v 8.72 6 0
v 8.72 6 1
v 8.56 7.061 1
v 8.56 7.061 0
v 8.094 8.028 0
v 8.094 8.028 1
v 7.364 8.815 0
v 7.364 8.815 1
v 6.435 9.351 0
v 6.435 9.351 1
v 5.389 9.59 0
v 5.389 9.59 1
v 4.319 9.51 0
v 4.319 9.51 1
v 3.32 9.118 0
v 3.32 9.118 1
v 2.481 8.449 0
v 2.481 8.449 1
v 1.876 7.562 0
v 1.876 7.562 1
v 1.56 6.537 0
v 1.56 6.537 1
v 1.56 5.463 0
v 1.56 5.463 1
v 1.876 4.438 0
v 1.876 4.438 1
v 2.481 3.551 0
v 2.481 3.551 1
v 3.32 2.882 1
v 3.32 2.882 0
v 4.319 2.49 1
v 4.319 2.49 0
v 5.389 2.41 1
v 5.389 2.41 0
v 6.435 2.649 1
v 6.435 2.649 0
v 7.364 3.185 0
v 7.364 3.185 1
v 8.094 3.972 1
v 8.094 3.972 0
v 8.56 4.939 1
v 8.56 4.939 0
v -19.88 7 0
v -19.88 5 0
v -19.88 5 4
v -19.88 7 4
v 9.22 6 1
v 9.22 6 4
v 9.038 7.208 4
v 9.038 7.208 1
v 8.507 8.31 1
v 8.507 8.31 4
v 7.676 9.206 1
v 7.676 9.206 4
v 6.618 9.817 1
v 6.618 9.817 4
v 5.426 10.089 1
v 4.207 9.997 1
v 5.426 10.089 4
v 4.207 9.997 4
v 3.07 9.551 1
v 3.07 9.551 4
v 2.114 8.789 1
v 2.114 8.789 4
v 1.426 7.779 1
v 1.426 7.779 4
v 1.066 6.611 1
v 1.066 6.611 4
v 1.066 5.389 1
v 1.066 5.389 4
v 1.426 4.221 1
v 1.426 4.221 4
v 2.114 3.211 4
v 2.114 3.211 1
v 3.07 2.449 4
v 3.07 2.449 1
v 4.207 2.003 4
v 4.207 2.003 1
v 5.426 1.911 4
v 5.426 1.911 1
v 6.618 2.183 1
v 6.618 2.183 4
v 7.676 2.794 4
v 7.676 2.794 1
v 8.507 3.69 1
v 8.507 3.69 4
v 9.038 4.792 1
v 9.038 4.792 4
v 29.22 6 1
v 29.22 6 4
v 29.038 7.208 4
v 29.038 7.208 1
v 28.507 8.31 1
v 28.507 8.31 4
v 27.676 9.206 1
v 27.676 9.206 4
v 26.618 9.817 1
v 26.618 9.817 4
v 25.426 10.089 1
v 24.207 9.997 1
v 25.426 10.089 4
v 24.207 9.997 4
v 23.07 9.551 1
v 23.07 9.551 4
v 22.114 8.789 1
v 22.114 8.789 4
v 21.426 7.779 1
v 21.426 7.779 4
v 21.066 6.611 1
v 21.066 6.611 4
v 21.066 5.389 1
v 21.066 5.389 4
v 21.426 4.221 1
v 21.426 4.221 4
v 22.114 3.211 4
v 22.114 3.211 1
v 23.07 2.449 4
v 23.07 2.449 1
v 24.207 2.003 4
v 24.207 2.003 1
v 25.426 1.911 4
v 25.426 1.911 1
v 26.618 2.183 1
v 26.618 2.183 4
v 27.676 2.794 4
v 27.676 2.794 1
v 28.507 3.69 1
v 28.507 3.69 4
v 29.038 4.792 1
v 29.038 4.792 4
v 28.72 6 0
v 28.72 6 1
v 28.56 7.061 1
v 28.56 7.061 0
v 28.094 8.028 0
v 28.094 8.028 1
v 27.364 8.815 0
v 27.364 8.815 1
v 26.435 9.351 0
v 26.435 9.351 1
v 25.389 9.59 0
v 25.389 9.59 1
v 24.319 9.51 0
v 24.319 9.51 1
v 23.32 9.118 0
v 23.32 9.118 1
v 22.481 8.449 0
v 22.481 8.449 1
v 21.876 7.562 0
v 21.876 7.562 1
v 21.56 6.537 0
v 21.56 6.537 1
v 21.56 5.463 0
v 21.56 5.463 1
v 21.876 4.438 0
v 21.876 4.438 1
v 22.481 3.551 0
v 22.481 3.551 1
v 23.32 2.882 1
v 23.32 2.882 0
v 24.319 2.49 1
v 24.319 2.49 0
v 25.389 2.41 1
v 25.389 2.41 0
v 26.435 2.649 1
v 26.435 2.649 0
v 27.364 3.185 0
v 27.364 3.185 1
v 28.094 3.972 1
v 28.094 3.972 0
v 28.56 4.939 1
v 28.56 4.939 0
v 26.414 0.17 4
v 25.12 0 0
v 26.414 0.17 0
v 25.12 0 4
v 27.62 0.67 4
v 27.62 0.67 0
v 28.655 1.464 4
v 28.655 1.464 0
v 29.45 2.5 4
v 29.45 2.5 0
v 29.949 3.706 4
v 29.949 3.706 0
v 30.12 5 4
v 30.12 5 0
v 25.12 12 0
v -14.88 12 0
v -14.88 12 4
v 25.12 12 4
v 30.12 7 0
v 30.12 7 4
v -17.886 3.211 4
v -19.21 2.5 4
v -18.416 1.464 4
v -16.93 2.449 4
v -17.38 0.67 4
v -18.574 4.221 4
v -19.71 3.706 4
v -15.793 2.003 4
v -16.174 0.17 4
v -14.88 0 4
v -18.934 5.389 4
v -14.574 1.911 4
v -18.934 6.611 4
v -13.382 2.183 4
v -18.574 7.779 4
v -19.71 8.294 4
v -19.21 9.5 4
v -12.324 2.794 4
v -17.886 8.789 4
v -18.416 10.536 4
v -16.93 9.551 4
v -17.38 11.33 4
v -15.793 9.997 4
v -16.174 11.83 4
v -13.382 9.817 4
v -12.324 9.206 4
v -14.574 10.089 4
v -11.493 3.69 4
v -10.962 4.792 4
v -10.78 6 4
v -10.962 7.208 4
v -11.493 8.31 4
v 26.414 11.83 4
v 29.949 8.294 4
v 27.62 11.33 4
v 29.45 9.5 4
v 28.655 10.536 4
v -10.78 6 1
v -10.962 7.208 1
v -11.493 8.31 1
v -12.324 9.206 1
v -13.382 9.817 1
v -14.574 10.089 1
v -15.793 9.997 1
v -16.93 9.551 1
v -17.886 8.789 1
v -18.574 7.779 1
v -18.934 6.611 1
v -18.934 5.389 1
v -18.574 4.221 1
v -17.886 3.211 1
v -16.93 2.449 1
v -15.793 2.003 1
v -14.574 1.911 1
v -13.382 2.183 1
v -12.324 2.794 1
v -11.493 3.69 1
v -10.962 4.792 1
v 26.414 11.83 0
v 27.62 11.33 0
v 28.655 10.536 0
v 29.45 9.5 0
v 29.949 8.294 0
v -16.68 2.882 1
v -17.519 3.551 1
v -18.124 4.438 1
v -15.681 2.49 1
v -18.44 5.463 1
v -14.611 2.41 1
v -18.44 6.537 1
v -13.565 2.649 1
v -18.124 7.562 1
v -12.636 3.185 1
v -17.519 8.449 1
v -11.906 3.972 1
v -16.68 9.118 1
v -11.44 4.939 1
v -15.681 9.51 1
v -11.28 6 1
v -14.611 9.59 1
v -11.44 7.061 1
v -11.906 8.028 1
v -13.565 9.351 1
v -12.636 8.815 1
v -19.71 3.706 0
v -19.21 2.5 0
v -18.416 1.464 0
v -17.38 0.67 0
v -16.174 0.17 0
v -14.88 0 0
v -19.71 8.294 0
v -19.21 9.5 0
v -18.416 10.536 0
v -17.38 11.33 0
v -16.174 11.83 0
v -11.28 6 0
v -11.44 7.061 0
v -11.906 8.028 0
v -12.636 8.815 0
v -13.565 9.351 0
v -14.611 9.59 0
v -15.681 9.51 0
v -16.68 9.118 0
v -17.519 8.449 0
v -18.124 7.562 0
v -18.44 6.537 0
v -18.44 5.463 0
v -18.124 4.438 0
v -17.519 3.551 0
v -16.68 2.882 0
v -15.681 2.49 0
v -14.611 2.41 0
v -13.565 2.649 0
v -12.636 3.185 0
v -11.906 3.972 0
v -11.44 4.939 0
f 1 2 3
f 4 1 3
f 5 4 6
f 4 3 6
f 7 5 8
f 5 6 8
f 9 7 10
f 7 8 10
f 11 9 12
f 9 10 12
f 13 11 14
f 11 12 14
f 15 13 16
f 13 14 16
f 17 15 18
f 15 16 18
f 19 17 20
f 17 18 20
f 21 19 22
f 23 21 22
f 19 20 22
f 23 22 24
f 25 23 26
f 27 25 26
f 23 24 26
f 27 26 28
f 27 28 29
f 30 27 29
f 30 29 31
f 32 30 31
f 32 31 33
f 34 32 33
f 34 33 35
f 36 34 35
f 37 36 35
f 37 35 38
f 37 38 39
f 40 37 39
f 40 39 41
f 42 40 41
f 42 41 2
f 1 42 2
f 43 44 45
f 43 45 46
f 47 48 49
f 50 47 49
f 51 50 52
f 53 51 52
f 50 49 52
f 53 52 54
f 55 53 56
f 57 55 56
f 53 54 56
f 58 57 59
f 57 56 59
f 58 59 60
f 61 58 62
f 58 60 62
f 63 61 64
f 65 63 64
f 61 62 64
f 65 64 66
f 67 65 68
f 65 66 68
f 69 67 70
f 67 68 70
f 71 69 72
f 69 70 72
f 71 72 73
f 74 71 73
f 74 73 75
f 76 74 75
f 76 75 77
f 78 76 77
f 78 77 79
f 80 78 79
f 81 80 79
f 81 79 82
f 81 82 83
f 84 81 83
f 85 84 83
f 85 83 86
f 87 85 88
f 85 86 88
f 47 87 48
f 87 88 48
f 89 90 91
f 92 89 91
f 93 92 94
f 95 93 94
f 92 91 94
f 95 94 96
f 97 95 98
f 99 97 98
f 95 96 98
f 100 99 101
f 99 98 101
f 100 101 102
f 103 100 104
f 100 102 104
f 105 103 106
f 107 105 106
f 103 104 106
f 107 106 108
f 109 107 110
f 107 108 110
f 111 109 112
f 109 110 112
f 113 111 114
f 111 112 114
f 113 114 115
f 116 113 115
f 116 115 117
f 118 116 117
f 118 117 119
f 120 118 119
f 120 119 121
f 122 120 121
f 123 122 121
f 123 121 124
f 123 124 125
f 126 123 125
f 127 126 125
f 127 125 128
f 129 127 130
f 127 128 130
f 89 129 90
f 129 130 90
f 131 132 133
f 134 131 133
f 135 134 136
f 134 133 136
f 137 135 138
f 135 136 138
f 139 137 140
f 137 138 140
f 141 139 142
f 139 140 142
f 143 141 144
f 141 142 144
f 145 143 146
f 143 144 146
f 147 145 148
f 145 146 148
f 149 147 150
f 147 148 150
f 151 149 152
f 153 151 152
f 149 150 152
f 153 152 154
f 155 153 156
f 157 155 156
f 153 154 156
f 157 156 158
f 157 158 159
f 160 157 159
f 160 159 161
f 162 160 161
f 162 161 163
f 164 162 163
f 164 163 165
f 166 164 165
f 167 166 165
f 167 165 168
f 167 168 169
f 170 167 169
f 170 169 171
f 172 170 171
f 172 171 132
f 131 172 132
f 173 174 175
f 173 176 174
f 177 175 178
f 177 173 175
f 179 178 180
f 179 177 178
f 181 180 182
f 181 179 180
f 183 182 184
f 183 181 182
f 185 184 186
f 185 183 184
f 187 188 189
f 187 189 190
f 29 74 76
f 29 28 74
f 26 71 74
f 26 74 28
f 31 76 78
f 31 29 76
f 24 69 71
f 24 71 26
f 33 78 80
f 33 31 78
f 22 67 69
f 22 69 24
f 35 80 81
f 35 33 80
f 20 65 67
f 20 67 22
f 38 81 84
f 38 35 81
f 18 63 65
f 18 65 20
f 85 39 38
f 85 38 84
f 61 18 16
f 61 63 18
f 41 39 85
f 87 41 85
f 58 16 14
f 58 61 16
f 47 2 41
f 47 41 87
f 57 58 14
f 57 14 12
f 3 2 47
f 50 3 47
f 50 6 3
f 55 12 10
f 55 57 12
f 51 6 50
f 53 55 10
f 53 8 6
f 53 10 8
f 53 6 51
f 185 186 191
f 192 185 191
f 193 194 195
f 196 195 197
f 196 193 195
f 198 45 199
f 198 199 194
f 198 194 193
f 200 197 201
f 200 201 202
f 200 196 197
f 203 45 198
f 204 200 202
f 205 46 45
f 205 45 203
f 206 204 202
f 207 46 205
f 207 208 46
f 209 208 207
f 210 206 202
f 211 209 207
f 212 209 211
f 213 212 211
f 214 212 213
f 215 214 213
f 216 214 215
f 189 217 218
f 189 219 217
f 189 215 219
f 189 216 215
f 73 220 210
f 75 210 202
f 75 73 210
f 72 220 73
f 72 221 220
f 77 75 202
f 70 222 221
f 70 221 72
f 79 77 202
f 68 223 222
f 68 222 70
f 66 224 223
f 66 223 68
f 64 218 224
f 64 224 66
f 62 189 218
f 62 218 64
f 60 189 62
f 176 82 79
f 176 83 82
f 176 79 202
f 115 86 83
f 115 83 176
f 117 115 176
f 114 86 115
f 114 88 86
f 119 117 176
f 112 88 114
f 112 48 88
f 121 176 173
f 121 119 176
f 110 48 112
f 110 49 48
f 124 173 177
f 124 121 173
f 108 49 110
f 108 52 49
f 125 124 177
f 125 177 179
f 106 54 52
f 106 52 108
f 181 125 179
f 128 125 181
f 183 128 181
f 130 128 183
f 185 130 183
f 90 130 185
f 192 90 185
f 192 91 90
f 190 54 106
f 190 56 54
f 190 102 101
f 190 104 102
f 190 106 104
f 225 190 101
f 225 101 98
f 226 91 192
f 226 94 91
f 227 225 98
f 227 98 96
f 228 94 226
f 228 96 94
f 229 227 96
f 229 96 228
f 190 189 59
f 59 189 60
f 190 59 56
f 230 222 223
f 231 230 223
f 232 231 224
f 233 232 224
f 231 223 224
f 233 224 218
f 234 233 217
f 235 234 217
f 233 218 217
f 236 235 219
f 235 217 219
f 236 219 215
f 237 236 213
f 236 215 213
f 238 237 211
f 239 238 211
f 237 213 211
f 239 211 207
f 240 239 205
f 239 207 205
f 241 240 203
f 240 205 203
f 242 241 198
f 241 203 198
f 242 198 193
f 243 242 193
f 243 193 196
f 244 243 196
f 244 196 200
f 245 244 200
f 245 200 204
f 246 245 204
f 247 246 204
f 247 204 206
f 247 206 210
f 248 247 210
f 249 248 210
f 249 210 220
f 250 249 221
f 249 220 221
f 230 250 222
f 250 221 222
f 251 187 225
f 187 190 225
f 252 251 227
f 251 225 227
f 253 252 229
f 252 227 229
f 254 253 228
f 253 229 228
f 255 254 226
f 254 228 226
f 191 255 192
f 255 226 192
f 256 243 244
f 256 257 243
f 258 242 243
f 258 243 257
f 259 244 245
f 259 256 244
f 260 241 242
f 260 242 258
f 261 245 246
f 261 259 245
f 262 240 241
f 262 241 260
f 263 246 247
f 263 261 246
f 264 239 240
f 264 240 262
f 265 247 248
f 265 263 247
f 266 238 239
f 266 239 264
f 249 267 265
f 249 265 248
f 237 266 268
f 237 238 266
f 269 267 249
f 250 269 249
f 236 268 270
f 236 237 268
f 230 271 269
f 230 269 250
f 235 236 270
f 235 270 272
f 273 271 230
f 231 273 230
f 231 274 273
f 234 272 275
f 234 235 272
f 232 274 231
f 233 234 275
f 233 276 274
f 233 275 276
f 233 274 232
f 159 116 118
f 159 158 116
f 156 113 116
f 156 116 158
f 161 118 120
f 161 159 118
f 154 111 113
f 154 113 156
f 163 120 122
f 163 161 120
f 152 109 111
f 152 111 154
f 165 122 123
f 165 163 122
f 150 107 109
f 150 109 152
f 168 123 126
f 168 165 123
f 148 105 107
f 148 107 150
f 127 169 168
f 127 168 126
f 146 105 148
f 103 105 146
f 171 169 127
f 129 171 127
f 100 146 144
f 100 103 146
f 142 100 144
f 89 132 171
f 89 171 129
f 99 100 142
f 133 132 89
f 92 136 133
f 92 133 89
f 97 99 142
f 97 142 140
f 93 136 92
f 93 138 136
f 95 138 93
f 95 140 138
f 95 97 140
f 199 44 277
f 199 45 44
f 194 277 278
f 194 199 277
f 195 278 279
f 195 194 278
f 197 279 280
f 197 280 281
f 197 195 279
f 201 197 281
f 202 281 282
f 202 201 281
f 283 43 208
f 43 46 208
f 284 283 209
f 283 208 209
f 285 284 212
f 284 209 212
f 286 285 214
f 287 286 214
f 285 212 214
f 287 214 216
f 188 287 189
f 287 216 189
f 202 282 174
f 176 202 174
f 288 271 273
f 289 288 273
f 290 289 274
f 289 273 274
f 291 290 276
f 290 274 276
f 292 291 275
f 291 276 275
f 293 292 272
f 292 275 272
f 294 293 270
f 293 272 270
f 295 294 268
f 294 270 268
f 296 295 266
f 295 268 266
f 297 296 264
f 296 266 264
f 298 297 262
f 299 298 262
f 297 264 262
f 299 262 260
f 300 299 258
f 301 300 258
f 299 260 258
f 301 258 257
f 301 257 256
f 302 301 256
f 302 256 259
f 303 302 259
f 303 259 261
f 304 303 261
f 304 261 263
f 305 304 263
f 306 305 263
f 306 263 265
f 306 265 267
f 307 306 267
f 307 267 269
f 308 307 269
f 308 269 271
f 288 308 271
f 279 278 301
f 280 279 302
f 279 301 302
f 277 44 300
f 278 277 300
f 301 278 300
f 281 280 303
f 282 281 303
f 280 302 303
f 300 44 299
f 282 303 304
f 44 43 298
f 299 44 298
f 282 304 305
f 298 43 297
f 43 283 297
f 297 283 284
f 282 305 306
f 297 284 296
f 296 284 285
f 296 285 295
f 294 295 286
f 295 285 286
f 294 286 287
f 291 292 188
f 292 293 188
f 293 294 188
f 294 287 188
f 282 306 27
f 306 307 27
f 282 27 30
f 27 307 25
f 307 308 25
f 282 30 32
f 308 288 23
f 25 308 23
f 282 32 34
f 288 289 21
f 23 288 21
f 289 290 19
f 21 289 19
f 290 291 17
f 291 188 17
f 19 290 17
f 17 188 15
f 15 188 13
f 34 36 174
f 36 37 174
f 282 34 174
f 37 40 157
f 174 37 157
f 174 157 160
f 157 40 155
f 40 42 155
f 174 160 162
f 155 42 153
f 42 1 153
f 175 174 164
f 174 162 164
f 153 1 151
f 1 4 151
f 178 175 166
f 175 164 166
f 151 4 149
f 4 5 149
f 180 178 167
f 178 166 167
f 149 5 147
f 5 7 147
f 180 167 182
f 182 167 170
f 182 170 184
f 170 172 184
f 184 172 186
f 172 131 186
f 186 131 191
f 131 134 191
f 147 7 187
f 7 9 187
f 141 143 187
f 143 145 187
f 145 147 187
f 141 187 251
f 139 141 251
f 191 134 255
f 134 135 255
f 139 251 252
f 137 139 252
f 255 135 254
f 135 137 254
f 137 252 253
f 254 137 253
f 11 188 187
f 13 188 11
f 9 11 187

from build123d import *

# Parameters (mm, degrees)
F0_W     = 50
F0_H     = 12
F1_DEPTH = 4
F2_R     = 4.1
F2_R_2   = 3.6
F3_DEPTH = 3
F4_DEPTH = 25
F5_R     = 5


with BuildPart() as f1:
    # F0 (on Top) → F1 (new body)
    with BuildSketch(Plane.XY):
        with Locations((5.119761, 6)):
            Rectangle(F0_W, F0_H)
    extrude(amount=F1_DEPTH)

    # F2 (on face) → F3 (cut)
    with BuildSketch(Plane.XY.offset(4)):
        with Locations((-14.880239, 6)):
            Circle(F2_R)
        with Locations((-14.880239, 6)):
            Circle(F2_R_2, mode=Mode.SUBTRACT)
        with Locations((5.119761, 6)):
            Circle(F2_R)
        with Locations((5.119761, 6)):
            Circle(F2_R_2, mode=Mode.SUBTRACT)
        with Locations((25.119761, 6)):
            Circle(F2_R)
        with Locations((25.119761, 6)):
            Circle(F2_R_2, mode=Mode.SUBTRACT)
    extrude(amount=-F3_DEPTH, mode=Mode.SUBTRACT)

    # F2 (on face) → F4 (cut)
    with BuildSketch(Plane.XY.offset(4)):
        with Locations((-14.880239, 6)):
            Circle(F2_R_2)
        with Locations((5.119761, 6)):
            Circle(F2_R_2)
        with Locations((25.119761, 6)):
            Circle(F2_R_2)
    extrude(amount=-F4_DEPTH, mode=Mode.SUBTRACT)

    # F5
    f5_edges = [f1.edges().sort_by_distance(p)[0] for p in [
        (30.119761, 12, 2),
        (30.119761, 0, 2),
        (-19.880239, 12, 2),
        (-19.880239, 0, 2),
    ]]
    fillet(f5_edges, radius=F5_R)


solid = f1.part
